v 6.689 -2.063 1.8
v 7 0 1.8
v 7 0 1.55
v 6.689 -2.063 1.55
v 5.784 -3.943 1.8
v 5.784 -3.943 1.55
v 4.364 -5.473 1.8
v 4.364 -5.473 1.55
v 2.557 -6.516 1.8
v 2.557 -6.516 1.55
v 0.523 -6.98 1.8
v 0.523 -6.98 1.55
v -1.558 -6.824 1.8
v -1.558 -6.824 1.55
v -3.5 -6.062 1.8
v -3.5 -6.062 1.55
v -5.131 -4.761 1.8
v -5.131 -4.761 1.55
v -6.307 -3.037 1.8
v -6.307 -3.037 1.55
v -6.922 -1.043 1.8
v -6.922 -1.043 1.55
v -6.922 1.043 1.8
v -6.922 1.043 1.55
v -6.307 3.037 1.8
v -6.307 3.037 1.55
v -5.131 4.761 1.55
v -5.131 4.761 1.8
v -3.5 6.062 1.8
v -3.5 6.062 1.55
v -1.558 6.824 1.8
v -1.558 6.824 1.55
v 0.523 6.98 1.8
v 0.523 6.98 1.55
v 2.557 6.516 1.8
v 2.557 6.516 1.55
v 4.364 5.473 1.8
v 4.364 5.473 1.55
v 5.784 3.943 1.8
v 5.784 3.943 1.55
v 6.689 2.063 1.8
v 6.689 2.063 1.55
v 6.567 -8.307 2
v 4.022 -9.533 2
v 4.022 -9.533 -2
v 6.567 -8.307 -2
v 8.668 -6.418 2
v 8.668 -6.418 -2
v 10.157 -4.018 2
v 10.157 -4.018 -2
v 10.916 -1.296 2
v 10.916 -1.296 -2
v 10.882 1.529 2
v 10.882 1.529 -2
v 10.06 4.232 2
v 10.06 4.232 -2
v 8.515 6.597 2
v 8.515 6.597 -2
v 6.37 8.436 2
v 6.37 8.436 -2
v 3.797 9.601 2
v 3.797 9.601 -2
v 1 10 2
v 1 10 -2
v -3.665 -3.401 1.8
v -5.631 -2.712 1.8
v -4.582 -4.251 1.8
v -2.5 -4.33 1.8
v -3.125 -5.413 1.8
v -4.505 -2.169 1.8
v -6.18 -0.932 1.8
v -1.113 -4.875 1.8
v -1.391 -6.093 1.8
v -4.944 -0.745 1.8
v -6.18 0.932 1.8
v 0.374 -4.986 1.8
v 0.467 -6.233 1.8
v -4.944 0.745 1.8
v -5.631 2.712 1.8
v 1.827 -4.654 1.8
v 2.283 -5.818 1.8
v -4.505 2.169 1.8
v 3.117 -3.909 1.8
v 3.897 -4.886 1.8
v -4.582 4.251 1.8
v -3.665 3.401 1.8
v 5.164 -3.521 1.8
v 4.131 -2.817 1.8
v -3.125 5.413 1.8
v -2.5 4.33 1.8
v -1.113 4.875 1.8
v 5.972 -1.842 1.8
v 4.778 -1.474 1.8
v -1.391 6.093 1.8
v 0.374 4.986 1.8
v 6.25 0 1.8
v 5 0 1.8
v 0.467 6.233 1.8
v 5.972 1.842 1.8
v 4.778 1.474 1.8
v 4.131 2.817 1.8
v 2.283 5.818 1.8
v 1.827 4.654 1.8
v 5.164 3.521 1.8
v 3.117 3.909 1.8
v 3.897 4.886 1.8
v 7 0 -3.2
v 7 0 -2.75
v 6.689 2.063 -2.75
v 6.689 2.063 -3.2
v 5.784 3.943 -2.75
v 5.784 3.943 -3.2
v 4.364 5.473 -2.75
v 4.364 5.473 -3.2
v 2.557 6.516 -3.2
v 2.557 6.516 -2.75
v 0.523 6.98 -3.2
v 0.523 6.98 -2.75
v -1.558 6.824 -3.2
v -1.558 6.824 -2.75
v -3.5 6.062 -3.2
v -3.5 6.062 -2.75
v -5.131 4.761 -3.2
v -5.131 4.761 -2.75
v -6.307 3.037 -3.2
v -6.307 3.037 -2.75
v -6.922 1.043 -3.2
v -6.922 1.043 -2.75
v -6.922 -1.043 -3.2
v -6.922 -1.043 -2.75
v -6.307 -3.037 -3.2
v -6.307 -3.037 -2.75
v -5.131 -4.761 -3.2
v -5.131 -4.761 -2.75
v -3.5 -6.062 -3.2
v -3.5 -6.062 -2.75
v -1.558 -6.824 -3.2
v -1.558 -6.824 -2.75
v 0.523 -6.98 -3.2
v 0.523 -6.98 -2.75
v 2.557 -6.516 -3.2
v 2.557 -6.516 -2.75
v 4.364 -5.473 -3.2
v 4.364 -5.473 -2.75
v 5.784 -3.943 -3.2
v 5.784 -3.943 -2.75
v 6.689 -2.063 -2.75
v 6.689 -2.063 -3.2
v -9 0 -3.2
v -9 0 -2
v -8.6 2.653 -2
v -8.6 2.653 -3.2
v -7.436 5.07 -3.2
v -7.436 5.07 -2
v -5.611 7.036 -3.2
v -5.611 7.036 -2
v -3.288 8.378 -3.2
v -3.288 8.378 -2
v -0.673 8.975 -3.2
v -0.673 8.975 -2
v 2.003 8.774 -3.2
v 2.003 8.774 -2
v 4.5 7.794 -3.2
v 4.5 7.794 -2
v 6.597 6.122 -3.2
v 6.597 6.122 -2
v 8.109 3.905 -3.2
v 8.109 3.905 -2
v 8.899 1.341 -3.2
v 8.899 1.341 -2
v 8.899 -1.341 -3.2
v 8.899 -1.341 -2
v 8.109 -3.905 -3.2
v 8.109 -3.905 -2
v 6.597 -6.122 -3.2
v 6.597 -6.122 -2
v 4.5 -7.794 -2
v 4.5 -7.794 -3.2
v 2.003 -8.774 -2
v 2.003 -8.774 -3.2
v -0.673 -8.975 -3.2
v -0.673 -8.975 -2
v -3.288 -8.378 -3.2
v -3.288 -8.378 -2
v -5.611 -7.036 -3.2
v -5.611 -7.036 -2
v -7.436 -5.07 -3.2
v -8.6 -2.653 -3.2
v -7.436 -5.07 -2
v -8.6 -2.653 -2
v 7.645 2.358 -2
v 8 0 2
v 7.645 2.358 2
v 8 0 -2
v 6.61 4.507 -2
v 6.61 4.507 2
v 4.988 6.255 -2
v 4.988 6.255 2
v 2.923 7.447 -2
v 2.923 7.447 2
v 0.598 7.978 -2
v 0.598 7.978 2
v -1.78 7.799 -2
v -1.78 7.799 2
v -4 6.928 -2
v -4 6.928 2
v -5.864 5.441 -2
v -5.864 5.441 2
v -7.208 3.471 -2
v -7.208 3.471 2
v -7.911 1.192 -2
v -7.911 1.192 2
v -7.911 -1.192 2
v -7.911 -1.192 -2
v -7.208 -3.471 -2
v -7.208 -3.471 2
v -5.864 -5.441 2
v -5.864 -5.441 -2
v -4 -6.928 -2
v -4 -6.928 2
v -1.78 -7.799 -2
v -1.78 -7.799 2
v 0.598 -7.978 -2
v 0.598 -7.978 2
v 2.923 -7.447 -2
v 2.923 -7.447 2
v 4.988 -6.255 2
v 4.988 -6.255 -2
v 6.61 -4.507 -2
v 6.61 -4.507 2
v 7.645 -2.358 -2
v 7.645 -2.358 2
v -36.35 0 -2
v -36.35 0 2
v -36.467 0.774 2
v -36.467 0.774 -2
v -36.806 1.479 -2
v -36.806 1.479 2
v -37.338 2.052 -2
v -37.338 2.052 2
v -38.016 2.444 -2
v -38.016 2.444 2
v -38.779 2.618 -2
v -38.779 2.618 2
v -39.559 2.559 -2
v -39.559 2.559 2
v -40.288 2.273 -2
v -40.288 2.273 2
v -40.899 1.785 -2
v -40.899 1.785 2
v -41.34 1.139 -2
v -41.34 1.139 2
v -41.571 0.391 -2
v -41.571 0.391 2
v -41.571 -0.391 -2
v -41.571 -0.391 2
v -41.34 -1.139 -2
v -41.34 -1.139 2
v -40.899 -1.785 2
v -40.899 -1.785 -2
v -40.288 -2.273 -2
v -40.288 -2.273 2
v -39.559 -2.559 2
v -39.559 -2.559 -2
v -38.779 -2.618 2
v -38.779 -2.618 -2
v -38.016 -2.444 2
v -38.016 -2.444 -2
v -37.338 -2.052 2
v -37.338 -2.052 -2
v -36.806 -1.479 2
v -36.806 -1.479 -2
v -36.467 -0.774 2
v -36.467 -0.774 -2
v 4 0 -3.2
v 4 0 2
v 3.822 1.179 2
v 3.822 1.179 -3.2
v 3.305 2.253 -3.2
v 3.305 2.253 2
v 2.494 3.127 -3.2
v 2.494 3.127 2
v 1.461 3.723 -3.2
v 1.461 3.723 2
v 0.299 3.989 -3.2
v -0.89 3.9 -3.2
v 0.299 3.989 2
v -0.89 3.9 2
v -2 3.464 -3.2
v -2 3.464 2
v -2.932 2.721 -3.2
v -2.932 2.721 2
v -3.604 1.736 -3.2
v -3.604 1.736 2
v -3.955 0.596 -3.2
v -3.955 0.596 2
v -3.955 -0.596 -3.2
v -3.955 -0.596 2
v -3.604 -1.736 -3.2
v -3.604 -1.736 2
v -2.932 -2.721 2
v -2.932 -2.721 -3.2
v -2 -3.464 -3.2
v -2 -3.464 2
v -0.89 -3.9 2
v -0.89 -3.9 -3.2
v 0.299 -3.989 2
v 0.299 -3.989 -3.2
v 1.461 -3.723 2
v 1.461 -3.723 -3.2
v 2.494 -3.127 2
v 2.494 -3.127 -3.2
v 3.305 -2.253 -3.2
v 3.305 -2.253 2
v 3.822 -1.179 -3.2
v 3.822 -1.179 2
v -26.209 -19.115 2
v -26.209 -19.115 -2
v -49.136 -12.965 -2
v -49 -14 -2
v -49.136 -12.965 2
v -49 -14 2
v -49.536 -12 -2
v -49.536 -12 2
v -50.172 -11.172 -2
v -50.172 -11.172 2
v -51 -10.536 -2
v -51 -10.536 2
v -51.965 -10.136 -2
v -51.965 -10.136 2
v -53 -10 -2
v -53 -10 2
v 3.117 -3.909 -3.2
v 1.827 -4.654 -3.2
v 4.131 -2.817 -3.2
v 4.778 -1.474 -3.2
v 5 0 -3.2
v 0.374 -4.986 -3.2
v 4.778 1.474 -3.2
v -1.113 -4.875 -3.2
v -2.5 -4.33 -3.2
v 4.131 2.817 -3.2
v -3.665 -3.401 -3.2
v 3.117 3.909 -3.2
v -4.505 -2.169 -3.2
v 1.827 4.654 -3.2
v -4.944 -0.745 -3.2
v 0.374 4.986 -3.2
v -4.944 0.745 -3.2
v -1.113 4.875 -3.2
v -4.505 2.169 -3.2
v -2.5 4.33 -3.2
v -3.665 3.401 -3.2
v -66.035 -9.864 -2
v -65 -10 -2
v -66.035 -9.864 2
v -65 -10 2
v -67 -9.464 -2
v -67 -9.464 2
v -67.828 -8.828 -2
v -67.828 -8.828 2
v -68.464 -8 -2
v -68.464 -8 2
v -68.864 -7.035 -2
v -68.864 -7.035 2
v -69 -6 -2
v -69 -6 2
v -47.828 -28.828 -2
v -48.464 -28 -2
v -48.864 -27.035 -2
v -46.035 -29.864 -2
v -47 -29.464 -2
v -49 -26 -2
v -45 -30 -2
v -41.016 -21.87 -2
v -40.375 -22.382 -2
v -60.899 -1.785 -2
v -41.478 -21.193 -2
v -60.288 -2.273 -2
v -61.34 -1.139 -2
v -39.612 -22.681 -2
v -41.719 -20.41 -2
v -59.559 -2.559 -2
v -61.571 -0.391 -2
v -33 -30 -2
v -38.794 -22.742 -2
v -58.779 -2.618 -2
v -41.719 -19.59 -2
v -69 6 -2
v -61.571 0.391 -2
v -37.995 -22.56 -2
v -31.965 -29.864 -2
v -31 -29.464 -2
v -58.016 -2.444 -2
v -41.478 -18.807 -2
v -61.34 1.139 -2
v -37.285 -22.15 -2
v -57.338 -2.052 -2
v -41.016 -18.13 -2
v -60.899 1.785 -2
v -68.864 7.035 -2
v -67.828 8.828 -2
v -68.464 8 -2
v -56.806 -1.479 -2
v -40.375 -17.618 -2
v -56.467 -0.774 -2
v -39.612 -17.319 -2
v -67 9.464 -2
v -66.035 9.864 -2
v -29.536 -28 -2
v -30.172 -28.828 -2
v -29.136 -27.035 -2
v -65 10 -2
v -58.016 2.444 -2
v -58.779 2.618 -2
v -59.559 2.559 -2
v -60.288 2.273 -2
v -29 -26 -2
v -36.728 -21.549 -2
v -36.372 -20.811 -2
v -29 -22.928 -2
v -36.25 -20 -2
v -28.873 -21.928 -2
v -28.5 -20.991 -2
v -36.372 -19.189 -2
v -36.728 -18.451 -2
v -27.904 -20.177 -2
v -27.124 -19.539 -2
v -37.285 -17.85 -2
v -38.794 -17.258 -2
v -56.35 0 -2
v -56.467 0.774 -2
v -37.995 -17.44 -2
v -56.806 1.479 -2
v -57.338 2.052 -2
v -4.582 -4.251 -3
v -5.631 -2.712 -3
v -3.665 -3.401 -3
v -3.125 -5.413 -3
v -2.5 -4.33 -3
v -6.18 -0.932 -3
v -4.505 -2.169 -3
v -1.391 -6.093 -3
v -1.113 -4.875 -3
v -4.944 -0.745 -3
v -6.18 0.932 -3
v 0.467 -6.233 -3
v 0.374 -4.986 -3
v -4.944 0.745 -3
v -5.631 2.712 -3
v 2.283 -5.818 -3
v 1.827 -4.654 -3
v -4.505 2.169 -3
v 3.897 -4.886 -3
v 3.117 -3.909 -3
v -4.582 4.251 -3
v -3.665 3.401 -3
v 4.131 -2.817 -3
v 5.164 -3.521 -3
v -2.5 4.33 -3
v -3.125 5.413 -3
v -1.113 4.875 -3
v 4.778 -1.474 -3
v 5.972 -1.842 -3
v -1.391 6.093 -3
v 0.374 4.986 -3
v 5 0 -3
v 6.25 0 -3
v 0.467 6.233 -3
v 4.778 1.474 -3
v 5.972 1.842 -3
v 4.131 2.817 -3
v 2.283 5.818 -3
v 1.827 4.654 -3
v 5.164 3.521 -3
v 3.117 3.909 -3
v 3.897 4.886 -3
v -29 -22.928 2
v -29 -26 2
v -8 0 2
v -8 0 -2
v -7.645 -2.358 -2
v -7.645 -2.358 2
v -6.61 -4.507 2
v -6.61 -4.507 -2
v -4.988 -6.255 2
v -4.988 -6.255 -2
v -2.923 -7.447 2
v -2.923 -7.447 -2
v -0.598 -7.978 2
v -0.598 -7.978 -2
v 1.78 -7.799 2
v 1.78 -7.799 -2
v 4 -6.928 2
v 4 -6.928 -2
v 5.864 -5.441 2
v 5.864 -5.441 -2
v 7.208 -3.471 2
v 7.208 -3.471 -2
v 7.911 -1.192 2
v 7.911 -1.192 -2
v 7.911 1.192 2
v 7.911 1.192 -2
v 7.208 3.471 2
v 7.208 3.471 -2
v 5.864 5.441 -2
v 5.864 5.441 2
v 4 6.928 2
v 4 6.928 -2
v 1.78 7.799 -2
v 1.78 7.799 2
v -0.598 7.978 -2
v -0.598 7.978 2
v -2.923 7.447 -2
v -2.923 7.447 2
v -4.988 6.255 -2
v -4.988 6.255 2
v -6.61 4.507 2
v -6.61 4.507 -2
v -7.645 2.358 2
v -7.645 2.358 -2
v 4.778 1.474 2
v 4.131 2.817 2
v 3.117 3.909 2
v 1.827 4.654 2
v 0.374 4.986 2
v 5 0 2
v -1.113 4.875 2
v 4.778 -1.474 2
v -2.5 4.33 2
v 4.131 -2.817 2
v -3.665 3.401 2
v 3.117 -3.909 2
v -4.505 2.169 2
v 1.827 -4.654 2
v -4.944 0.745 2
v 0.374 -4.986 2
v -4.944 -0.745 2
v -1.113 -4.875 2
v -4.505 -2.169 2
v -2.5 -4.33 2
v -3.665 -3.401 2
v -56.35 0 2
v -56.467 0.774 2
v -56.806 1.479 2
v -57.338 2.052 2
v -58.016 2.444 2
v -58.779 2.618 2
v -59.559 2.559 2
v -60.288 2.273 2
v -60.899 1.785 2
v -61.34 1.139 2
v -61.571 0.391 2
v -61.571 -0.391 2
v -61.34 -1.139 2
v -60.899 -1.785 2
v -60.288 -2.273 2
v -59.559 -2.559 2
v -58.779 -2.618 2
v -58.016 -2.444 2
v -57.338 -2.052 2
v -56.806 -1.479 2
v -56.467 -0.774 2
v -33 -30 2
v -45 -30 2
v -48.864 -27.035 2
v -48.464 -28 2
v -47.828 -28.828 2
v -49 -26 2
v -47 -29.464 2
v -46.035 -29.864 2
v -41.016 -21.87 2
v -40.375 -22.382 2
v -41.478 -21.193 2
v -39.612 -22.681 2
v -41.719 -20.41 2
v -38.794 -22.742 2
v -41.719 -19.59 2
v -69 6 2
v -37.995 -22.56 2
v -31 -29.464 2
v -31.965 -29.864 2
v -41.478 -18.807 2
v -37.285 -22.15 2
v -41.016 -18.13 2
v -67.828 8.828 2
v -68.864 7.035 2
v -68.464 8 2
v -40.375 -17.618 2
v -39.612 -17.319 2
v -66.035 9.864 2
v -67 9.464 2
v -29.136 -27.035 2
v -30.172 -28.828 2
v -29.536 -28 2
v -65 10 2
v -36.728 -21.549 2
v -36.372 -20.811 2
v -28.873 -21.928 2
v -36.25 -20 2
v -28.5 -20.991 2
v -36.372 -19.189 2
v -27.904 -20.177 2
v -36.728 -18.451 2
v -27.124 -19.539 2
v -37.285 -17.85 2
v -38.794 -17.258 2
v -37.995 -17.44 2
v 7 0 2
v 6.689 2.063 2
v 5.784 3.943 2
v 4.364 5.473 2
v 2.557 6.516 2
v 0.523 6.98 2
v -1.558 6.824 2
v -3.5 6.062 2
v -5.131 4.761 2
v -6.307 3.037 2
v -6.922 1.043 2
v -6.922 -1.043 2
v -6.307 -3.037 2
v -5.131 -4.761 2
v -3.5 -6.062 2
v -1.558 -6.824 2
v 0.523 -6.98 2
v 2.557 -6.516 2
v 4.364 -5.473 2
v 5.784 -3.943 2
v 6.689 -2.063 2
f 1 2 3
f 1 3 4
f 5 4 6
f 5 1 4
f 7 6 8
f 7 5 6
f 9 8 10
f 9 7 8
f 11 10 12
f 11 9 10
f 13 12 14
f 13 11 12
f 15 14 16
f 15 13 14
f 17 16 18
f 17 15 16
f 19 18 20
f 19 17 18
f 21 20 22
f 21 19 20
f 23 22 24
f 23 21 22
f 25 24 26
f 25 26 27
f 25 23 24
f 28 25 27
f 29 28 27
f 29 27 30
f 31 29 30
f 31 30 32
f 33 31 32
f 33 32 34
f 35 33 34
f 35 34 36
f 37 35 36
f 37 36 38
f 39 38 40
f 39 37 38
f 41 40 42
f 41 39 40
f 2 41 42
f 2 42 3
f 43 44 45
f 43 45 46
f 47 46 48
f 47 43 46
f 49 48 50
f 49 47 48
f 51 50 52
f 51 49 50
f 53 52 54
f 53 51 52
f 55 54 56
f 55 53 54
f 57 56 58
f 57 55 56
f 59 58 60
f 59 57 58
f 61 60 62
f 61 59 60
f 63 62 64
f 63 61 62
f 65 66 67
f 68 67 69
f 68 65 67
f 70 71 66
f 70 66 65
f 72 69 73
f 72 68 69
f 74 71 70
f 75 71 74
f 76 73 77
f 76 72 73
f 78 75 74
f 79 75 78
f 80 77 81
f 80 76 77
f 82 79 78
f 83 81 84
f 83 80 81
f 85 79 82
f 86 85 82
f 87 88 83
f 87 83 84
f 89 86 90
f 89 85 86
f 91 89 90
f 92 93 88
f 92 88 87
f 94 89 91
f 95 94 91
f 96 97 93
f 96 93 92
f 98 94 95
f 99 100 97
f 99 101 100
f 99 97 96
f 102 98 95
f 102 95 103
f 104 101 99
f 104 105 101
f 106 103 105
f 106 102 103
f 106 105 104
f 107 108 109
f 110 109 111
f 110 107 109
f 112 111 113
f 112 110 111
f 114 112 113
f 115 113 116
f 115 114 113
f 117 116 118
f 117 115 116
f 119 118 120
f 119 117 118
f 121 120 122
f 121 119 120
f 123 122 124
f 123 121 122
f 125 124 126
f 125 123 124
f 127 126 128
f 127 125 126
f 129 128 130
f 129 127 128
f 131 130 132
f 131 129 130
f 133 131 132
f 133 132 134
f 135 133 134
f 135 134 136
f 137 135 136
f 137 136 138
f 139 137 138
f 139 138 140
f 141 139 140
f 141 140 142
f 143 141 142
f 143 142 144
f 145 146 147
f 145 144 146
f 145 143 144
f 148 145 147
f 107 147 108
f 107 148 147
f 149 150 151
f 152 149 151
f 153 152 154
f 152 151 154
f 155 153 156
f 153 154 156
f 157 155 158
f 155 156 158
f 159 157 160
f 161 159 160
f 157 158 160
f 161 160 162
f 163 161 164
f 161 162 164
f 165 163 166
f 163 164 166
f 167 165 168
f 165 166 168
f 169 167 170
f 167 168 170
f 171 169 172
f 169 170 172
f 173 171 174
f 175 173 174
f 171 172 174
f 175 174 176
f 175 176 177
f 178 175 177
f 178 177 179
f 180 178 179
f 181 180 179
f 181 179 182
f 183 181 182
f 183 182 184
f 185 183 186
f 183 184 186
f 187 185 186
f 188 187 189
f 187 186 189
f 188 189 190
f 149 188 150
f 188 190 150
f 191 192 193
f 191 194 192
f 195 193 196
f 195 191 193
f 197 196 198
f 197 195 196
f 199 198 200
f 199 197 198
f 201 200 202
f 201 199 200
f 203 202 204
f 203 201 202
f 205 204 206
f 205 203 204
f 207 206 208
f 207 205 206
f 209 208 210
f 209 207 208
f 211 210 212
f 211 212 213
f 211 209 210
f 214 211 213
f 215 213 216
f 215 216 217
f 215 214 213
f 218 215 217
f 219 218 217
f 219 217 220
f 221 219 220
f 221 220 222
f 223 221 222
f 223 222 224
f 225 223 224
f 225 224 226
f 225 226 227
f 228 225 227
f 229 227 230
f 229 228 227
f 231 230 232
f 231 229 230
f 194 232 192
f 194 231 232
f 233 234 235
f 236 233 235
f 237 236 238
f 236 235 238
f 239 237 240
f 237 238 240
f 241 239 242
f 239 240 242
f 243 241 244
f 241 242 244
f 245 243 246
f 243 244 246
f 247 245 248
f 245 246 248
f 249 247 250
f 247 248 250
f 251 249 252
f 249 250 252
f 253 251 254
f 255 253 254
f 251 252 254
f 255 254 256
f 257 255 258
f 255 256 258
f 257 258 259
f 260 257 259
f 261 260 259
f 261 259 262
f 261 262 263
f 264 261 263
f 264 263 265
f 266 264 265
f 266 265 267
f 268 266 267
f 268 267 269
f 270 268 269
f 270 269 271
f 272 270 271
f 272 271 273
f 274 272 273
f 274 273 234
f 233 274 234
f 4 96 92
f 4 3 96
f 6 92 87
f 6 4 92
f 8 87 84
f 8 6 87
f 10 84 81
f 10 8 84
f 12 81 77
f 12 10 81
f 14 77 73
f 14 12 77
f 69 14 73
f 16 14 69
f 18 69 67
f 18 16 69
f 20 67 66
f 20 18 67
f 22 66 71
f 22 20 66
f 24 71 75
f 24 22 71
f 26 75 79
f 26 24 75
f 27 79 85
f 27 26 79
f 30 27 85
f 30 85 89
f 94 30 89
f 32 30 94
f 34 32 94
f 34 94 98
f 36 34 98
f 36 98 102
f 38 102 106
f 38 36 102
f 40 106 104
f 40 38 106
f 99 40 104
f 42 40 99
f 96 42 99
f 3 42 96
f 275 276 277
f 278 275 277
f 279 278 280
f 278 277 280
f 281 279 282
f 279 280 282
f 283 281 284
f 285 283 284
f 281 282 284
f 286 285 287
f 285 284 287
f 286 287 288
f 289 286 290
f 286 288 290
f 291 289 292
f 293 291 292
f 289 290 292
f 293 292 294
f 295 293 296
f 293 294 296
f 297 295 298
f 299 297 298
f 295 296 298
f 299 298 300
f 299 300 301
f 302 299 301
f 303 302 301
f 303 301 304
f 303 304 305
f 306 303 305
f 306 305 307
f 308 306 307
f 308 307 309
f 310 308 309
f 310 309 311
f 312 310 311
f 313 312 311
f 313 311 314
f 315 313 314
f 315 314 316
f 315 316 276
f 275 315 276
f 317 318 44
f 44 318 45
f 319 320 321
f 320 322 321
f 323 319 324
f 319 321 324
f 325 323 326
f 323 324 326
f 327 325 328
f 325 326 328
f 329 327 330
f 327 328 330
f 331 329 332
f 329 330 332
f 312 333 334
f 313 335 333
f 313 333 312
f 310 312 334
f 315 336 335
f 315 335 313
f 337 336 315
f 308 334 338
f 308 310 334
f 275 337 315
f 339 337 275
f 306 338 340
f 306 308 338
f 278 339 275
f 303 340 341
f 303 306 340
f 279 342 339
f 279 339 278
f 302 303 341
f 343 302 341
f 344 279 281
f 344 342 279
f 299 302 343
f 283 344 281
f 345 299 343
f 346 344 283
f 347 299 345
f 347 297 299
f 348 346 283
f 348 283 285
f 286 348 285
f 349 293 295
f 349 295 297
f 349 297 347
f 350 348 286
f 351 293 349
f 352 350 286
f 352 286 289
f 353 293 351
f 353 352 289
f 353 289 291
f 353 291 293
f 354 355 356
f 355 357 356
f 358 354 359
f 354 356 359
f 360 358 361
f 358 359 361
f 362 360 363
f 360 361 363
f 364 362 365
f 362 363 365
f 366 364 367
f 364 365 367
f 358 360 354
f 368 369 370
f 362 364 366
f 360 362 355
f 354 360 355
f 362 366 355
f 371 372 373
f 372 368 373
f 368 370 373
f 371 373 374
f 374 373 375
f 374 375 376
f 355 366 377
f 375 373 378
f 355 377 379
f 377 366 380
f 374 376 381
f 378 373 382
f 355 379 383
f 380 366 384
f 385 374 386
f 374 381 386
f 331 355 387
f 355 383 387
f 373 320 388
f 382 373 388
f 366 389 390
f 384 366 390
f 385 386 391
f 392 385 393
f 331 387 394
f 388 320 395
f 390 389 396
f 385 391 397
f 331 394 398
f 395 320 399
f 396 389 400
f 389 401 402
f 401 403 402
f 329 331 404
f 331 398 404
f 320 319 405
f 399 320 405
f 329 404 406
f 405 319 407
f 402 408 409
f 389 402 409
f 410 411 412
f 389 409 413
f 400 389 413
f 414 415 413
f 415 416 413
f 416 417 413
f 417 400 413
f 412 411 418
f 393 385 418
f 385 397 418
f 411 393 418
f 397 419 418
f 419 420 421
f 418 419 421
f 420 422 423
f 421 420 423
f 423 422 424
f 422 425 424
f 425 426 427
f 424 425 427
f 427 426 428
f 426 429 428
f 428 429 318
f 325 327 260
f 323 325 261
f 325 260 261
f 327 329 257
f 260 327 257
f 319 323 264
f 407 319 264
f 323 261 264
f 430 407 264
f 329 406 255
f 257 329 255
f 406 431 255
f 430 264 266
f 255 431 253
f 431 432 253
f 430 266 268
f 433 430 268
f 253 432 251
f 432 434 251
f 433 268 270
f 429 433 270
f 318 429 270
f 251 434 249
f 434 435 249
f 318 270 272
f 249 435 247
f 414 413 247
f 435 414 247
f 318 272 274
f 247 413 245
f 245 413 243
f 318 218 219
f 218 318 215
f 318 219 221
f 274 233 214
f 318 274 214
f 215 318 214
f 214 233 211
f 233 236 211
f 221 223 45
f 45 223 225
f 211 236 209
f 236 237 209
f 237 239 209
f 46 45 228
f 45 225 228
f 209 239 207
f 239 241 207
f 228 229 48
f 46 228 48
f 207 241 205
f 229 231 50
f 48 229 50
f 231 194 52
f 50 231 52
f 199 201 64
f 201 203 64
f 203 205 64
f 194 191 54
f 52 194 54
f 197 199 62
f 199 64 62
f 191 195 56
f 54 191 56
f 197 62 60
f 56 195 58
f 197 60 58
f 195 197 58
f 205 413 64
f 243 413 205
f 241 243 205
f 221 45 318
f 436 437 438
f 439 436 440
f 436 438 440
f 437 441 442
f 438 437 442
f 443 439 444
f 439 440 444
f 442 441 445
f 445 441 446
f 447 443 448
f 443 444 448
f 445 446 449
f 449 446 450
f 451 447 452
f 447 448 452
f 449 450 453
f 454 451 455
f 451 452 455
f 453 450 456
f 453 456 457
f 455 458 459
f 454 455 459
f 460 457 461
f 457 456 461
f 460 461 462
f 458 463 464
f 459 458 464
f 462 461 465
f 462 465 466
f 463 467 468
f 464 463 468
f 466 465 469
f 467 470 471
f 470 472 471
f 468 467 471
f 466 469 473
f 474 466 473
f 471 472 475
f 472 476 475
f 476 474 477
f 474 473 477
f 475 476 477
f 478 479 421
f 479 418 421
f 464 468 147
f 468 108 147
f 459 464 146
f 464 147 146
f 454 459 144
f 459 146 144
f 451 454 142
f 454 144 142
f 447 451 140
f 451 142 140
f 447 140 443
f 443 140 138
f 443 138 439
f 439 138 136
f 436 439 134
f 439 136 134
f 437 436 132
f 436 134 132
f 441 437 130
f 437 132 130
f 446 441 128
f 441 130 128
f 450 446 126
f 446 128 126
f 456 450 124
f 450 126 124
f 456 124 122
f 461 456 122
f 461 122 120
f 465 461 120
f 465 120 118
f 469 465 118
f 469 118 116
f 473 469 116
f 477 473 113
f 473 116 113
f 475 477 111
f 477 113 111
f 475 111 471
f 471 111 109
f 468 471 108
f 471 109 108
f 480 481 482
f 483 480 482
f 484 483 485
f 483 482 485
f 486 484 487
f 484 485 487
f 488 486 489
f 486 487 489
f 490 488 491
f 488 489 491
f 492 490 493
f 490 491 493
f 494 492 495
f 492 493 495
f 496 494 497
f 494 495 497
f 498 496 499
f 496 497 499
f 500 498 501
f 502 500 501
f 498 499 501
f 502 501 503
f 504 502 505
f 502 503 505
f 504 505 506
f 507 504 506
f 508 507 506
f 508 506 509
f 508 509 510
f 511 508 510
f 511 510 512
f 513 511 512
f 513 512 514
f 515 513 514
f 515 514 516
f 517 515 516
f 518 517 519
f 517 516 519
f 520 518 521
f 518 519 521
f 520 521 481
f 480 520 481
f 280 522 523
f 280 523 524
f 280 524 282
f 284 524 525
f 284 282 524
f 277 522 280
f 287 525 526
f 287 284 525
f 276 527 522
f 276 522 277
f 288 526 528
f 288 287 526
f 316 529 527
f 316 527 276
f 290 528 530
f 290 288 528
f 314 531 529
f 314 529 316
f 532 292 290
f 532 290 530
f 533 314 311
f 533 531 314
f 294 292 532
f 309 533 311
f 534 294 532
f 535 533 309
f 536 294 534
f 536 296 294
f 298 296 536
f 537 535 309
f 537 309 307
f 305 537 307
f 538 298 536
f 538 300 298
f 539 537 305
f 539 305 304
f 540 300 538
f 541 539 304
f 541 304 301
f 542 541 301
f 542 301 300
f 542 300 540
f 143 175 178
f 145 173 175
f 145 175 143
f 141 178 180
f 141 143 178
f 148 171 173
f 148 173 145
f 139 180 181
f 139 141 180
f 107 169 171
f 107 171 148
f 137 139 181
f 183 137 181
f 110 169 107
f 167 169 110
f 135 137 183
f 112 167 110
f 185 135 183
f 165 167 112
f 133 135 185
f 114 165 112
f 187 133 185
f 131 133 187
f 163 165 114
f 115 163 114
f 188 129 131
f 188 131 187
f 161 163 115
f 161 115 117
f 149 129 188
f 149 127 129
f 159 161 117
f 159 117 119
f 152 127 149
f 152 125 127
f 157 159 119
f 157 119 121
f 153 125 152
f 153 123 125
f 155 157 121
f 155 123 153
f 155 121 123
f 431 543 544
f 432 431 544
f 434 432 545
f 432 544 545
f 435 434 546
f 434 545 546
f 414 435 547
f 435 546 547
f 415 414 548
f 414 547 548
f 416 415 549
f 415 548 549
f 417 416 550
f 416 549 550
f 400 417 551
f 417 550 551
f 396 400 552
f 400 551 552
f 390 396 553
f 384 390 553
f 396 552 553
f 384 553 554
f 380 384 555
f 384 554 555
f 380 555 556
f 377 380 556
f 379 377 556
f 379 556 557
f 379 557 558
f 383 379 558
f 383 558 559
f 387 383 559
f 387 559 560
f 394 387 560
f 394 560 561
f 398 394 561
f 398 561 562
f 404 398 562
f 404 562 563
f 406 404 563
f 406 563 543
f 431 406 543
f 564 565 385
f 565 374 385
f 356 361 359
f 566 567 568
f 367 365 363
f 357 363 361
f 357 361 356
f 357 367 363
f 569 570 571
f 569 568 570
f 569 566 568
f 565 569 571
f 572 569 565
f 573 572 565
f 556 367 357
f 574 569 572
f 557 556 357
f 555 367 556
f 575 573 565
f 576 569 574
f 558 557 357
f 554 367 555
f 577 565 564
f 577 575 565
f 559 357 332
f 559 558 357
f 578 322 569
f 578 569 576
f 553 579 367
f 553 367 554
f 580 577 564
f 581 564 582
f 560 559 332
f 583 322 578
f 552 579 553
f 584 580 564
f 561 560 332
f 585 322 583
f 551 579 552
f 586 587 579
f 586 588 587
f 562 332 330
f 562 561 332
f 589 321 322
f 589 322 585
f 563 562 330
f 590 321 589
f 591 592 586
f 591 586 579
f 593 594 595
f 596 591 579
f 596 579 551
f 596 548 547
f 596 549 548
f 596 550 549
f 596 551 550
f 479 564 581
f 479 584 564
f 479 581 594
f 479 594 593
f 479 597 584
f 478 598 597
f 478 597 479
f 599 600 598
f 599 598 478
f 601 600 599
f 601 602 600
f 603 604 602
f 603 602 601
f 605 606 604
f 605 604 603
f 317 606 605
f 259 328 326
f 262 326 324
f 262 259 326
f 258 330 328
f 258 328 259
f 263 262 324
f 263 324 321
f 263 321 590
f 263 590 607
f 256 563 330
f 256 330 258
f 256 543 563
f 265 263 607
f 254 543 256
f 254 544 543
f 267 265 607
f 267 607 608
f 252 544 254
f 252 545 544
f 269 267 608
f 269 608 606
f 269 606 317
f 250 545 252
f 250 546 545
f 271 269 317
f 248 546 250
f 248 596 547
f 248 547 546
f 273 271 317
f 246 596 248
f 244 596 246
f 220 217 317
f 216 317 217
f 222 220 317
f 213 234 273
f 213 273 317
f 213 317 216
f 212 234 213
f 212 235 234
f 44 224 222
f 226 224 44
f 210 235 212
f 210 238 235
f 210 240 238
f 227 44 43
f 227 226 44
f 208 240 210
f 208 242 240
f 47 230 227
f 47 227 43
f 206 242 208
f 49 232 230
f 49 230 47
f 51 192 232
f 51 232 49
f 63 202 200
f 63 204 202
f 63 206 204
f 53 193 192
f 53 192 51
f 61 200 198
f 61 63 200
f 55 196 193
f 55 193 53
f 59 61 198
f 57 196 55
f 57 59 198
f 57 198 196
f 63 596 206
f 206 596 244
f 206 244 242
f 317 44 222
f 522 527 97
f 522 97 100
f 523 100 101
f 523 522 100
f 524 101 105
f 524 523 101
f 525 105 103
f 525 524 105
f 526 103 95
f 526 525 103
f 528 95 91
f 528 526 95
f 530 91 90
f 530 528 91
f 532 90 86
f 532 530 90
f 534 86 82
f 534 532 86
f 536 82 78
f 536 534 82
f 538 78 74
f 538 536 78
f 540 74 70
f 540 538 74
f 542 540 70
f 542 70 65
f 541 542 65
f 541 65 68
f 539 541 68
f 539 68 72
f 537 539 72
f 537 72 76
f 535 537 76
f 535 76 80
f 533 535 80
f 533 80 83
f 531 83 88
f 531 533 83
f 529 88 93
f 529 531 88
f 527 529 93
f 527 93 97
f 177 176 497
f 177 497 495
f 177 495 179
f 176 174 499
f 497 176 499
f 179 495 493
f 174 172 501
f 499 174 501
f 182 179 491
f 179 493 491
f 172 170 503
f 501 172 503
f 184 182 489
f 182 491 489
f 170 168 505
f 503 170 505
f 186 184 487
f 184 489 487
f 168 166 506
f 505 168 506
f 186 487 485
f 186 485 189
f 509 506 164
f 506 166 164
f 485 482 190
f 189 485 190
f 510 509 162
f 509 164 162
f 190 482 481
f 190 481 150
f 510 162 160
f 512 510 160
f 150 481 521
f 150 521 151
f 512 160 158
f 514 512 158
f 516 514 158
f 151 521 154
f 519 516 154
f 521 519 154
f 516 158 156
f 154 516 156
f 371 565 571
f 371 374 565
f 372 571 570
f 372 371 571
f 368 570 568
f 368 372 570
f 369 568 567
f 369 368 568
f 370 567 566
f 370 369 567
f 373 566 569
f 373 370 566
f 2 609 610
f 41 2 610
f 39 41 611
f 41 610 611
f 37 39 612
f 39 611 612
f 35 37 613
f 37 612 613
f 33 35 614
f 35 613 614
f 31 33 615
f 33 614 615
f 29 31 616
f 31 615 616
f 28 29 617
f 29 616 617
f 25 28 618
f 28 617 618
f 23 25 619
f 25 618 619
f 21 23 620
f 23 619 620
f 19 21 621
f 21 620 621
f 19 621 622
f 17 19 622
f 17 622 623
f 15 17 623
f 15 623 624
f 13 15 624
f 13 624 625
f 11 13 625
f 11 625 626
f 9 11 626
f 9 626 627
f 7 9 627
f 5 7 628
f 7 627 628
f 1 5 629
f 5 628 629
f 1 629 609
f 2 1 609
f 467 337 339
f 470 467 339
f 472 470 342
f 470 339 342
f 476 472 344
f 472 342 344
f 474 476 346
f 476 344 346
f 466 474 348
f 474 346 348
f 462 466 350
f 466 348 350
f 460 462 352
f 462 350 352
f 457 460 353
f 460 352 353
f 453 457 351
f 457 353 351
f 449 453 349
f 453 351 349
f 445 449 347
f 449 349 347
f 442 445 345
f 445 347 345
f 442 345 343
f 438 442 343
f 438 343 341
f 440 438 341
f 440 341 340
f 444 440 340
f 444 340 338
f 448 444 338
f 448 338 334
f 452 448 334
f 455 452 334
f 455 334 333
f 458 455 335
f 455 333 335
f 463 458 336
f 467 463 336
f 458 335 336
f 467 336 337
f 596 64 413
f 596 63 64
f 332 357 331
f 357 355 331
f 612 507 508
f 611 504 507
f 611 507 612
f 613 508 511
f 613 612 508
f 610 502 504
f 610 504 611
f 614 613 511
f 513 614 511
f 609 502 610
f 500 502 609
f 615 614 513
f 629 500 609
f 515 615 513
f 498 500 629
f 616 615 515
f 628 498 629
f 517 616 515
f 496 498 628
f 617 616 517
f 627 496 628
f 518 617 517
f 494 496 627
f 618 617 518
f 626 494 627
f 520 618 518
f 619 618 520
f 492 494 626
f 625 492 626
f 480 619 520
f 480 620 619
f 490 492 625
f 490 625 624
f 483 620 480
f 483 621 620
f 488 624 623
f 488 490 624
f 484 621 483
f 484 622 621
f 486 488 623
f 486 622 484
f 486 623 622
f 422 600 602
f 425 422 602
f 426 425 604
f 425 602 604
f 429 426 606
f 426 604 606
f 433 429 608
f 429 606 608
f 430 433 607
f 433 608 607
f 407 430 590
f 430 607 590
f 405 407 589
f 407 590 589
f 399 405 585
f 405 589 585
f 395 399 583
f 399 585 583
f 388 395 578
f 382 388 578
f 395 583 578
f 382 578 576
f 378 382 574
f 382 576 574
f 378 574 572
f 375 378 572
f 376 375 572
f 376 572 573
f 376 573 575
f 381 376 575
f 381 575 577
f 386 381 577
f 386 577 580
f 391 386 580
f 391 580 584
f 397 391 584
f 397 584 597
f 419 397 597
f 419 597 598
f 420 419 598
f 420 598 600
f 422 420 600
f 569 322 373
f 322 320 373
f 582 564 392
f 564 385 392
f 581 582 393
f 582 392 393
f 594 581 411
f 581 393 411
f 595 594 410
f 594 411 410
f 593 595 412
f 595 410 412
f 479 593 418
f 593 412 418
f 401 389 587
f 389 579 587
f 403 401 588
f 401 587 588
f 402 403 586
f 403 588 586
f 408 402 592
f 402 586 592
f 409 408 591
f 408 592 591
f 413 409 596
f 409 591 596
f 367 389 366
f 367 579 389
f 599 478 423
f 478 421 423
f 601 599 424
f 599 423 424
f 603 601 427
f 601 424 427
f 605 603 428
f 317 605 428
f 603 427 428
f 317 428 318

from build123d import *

# Parameters (mm, degrees)
SKETCH1_R           = 10
SKETCH1_R_2         = 8
BOSS_EXTRUDE1_DEPTH = 2
SKETCH2_R           = 2.75
SKETCH2_R_2         = 2.625
CUT_EXTRUDE1_DEPTH  = 76.345869163
FILLET1_R           = 4
SKETCH3_R           = 9
BOSS_EXTRUDE2_DEPTH = 1.2
SKETCH4_R           = 8
BOSS_EXTRUDE3_DEPTH = 4
SKETCH5_R           = 4
CUT_EXTRUDE2_DEPTH  = 76.419095725
SKETCH5_3_R         = 7
SKETCH5_3_R_2       = 5
CUT_EXTRUDE3_DEPTH  = 0.2


with BuildPart() as part:
    # Sketch1 → Boss-Extrude1 (new, symmetric)
    # profile 1 of 2: a face of its own
    with BuildSketch(Plane.XY):
        with BuildLine():
            ThreePointArc((4.021694793, -9.532542189), (-8.882444583, -1.528819498), (1, 10))
            Line((1, 10), (-69, 10))
            Line((-69, 10), (-69, -10))
            Line((-69, -10), (-49, -10))
            Line((-49, -10), (-49, -30))
            Line((-49, -30), (-29, -30))
            Line((-29, -30), (-29, -20))
            Line((-29, -20), (4.021694793, -9.532542189))
        make_face()
    # profile 2 of 2: a face of its own
    with BuildSketch(Plane.XY):
        with Locations((1, 0)):
            Circle(SKETCH1_R)
        Circle(SKETCH1_R_2, mode=Mode.SUBTRACT)
    extrude(amount=BOSS_EXTRUDE1_DEPTH, both=True)

    # Sketch2 → Cut-Extrude1 (cut, through all)
    with BuildSketch(Plane.XY.offset(2)):
        with Locations((-39, -20)):
            Circle(SKETCH2_R)
        with Locations((-58.975, 0)):
            Circle(SKETCH2_R_2)
        with Locations((-38.975, 0)):
            Circle(SKETCH2_R_2)
    extrude(amount=-CUT_EXTRUDE1_DEPTH, mode=Mode.SUBTRACT)

    # Fillet1
    fillet1_edges = [part.edges().sort_by_distance(p)[0] for p in [
        (-29, -20, 0),
        (-29, -30, 0),
        (-49, -30, 0),
        (-49, -10, 0),
        (-69, -10, 0),
        (-69, 10, 0),
    ]]
    fillet(fillet1_edges, radius=FILLET1_R)


with BuildPart() as body_2:
    # Sketch3 → Boss-Extrude2 (new body)
    with BuildSketch(Plane(origin=(0, 0, -2), x_dir=(-1, 0, 0), z_dir=(0, 0, -1))):
        Circle(SKETCH3_R)
    extrude(amount=BOSS_EXTRUDE2_DEPTH)

    # Sketch4 → Boss-Extrude3 (add)
    with BuildSketch(Plane.XY.offset(-2)):
        with Locations(Location((0, 0, 0), (0, 0, 180))):
            Circle(SKETCH4_R)
    extrude(amount=BOSS_EXTRUDE3_DEPTH)

    # Sketch5 → Cut-Extrude2 (cut, through all)
    with BuildSketch(Plane.XY.offset(2)):
        Circle(SKETCH5_R)
    extrude(amount=-CUT_EXTRUDE2_DEPTH, mode=Mode.SUBTRACT)

    # Sketch5<3> → Cut-Extrude3 (cut)
    with BuildSketch(Plane.XY.offset(2)):
        Circle(SKETCH5_3_R)
        Circle(SKETCH5_3_R_2, mode=Mode.SUBTRACT)
    cut_extrude3 = extrude(amount=-CUT_EXTRUDE3_DEPTH, mode=Mode.SUBTRACT)

    # Mirror8: Cut-Extrude3 across plane
    add(cut_extrude3.mirror(Plane.XY.offset(-0.6)), mode=Mode.SUBTRACT)

    # Sketch6 → Cut-Revolve1 (revolve, cut)
    with BuildSketch(Plane(origin=(0, 0, 0), x_dir=(0, 0, -1), z_dir=(1, 0, 0)), mode=Mode.PRIVATE) as cut_revolve1_sk:
        Polygon((-1.8, 6.25), (-1.55, 7), (-1.8, 7), align=None)
        Polygon((3, 6.25), (2.75, 7), (3, 7), align=None)
    revolve(cut_revolve1_sk.sketch.rotate(Axis((0, 0, 2), (0, 0, -1)), 90), axis=Axis((0, 0, 2), (0, 0, -1)), mode=Mode.SUBTRACT)


solid = Compound([part.part, body_2.part])
